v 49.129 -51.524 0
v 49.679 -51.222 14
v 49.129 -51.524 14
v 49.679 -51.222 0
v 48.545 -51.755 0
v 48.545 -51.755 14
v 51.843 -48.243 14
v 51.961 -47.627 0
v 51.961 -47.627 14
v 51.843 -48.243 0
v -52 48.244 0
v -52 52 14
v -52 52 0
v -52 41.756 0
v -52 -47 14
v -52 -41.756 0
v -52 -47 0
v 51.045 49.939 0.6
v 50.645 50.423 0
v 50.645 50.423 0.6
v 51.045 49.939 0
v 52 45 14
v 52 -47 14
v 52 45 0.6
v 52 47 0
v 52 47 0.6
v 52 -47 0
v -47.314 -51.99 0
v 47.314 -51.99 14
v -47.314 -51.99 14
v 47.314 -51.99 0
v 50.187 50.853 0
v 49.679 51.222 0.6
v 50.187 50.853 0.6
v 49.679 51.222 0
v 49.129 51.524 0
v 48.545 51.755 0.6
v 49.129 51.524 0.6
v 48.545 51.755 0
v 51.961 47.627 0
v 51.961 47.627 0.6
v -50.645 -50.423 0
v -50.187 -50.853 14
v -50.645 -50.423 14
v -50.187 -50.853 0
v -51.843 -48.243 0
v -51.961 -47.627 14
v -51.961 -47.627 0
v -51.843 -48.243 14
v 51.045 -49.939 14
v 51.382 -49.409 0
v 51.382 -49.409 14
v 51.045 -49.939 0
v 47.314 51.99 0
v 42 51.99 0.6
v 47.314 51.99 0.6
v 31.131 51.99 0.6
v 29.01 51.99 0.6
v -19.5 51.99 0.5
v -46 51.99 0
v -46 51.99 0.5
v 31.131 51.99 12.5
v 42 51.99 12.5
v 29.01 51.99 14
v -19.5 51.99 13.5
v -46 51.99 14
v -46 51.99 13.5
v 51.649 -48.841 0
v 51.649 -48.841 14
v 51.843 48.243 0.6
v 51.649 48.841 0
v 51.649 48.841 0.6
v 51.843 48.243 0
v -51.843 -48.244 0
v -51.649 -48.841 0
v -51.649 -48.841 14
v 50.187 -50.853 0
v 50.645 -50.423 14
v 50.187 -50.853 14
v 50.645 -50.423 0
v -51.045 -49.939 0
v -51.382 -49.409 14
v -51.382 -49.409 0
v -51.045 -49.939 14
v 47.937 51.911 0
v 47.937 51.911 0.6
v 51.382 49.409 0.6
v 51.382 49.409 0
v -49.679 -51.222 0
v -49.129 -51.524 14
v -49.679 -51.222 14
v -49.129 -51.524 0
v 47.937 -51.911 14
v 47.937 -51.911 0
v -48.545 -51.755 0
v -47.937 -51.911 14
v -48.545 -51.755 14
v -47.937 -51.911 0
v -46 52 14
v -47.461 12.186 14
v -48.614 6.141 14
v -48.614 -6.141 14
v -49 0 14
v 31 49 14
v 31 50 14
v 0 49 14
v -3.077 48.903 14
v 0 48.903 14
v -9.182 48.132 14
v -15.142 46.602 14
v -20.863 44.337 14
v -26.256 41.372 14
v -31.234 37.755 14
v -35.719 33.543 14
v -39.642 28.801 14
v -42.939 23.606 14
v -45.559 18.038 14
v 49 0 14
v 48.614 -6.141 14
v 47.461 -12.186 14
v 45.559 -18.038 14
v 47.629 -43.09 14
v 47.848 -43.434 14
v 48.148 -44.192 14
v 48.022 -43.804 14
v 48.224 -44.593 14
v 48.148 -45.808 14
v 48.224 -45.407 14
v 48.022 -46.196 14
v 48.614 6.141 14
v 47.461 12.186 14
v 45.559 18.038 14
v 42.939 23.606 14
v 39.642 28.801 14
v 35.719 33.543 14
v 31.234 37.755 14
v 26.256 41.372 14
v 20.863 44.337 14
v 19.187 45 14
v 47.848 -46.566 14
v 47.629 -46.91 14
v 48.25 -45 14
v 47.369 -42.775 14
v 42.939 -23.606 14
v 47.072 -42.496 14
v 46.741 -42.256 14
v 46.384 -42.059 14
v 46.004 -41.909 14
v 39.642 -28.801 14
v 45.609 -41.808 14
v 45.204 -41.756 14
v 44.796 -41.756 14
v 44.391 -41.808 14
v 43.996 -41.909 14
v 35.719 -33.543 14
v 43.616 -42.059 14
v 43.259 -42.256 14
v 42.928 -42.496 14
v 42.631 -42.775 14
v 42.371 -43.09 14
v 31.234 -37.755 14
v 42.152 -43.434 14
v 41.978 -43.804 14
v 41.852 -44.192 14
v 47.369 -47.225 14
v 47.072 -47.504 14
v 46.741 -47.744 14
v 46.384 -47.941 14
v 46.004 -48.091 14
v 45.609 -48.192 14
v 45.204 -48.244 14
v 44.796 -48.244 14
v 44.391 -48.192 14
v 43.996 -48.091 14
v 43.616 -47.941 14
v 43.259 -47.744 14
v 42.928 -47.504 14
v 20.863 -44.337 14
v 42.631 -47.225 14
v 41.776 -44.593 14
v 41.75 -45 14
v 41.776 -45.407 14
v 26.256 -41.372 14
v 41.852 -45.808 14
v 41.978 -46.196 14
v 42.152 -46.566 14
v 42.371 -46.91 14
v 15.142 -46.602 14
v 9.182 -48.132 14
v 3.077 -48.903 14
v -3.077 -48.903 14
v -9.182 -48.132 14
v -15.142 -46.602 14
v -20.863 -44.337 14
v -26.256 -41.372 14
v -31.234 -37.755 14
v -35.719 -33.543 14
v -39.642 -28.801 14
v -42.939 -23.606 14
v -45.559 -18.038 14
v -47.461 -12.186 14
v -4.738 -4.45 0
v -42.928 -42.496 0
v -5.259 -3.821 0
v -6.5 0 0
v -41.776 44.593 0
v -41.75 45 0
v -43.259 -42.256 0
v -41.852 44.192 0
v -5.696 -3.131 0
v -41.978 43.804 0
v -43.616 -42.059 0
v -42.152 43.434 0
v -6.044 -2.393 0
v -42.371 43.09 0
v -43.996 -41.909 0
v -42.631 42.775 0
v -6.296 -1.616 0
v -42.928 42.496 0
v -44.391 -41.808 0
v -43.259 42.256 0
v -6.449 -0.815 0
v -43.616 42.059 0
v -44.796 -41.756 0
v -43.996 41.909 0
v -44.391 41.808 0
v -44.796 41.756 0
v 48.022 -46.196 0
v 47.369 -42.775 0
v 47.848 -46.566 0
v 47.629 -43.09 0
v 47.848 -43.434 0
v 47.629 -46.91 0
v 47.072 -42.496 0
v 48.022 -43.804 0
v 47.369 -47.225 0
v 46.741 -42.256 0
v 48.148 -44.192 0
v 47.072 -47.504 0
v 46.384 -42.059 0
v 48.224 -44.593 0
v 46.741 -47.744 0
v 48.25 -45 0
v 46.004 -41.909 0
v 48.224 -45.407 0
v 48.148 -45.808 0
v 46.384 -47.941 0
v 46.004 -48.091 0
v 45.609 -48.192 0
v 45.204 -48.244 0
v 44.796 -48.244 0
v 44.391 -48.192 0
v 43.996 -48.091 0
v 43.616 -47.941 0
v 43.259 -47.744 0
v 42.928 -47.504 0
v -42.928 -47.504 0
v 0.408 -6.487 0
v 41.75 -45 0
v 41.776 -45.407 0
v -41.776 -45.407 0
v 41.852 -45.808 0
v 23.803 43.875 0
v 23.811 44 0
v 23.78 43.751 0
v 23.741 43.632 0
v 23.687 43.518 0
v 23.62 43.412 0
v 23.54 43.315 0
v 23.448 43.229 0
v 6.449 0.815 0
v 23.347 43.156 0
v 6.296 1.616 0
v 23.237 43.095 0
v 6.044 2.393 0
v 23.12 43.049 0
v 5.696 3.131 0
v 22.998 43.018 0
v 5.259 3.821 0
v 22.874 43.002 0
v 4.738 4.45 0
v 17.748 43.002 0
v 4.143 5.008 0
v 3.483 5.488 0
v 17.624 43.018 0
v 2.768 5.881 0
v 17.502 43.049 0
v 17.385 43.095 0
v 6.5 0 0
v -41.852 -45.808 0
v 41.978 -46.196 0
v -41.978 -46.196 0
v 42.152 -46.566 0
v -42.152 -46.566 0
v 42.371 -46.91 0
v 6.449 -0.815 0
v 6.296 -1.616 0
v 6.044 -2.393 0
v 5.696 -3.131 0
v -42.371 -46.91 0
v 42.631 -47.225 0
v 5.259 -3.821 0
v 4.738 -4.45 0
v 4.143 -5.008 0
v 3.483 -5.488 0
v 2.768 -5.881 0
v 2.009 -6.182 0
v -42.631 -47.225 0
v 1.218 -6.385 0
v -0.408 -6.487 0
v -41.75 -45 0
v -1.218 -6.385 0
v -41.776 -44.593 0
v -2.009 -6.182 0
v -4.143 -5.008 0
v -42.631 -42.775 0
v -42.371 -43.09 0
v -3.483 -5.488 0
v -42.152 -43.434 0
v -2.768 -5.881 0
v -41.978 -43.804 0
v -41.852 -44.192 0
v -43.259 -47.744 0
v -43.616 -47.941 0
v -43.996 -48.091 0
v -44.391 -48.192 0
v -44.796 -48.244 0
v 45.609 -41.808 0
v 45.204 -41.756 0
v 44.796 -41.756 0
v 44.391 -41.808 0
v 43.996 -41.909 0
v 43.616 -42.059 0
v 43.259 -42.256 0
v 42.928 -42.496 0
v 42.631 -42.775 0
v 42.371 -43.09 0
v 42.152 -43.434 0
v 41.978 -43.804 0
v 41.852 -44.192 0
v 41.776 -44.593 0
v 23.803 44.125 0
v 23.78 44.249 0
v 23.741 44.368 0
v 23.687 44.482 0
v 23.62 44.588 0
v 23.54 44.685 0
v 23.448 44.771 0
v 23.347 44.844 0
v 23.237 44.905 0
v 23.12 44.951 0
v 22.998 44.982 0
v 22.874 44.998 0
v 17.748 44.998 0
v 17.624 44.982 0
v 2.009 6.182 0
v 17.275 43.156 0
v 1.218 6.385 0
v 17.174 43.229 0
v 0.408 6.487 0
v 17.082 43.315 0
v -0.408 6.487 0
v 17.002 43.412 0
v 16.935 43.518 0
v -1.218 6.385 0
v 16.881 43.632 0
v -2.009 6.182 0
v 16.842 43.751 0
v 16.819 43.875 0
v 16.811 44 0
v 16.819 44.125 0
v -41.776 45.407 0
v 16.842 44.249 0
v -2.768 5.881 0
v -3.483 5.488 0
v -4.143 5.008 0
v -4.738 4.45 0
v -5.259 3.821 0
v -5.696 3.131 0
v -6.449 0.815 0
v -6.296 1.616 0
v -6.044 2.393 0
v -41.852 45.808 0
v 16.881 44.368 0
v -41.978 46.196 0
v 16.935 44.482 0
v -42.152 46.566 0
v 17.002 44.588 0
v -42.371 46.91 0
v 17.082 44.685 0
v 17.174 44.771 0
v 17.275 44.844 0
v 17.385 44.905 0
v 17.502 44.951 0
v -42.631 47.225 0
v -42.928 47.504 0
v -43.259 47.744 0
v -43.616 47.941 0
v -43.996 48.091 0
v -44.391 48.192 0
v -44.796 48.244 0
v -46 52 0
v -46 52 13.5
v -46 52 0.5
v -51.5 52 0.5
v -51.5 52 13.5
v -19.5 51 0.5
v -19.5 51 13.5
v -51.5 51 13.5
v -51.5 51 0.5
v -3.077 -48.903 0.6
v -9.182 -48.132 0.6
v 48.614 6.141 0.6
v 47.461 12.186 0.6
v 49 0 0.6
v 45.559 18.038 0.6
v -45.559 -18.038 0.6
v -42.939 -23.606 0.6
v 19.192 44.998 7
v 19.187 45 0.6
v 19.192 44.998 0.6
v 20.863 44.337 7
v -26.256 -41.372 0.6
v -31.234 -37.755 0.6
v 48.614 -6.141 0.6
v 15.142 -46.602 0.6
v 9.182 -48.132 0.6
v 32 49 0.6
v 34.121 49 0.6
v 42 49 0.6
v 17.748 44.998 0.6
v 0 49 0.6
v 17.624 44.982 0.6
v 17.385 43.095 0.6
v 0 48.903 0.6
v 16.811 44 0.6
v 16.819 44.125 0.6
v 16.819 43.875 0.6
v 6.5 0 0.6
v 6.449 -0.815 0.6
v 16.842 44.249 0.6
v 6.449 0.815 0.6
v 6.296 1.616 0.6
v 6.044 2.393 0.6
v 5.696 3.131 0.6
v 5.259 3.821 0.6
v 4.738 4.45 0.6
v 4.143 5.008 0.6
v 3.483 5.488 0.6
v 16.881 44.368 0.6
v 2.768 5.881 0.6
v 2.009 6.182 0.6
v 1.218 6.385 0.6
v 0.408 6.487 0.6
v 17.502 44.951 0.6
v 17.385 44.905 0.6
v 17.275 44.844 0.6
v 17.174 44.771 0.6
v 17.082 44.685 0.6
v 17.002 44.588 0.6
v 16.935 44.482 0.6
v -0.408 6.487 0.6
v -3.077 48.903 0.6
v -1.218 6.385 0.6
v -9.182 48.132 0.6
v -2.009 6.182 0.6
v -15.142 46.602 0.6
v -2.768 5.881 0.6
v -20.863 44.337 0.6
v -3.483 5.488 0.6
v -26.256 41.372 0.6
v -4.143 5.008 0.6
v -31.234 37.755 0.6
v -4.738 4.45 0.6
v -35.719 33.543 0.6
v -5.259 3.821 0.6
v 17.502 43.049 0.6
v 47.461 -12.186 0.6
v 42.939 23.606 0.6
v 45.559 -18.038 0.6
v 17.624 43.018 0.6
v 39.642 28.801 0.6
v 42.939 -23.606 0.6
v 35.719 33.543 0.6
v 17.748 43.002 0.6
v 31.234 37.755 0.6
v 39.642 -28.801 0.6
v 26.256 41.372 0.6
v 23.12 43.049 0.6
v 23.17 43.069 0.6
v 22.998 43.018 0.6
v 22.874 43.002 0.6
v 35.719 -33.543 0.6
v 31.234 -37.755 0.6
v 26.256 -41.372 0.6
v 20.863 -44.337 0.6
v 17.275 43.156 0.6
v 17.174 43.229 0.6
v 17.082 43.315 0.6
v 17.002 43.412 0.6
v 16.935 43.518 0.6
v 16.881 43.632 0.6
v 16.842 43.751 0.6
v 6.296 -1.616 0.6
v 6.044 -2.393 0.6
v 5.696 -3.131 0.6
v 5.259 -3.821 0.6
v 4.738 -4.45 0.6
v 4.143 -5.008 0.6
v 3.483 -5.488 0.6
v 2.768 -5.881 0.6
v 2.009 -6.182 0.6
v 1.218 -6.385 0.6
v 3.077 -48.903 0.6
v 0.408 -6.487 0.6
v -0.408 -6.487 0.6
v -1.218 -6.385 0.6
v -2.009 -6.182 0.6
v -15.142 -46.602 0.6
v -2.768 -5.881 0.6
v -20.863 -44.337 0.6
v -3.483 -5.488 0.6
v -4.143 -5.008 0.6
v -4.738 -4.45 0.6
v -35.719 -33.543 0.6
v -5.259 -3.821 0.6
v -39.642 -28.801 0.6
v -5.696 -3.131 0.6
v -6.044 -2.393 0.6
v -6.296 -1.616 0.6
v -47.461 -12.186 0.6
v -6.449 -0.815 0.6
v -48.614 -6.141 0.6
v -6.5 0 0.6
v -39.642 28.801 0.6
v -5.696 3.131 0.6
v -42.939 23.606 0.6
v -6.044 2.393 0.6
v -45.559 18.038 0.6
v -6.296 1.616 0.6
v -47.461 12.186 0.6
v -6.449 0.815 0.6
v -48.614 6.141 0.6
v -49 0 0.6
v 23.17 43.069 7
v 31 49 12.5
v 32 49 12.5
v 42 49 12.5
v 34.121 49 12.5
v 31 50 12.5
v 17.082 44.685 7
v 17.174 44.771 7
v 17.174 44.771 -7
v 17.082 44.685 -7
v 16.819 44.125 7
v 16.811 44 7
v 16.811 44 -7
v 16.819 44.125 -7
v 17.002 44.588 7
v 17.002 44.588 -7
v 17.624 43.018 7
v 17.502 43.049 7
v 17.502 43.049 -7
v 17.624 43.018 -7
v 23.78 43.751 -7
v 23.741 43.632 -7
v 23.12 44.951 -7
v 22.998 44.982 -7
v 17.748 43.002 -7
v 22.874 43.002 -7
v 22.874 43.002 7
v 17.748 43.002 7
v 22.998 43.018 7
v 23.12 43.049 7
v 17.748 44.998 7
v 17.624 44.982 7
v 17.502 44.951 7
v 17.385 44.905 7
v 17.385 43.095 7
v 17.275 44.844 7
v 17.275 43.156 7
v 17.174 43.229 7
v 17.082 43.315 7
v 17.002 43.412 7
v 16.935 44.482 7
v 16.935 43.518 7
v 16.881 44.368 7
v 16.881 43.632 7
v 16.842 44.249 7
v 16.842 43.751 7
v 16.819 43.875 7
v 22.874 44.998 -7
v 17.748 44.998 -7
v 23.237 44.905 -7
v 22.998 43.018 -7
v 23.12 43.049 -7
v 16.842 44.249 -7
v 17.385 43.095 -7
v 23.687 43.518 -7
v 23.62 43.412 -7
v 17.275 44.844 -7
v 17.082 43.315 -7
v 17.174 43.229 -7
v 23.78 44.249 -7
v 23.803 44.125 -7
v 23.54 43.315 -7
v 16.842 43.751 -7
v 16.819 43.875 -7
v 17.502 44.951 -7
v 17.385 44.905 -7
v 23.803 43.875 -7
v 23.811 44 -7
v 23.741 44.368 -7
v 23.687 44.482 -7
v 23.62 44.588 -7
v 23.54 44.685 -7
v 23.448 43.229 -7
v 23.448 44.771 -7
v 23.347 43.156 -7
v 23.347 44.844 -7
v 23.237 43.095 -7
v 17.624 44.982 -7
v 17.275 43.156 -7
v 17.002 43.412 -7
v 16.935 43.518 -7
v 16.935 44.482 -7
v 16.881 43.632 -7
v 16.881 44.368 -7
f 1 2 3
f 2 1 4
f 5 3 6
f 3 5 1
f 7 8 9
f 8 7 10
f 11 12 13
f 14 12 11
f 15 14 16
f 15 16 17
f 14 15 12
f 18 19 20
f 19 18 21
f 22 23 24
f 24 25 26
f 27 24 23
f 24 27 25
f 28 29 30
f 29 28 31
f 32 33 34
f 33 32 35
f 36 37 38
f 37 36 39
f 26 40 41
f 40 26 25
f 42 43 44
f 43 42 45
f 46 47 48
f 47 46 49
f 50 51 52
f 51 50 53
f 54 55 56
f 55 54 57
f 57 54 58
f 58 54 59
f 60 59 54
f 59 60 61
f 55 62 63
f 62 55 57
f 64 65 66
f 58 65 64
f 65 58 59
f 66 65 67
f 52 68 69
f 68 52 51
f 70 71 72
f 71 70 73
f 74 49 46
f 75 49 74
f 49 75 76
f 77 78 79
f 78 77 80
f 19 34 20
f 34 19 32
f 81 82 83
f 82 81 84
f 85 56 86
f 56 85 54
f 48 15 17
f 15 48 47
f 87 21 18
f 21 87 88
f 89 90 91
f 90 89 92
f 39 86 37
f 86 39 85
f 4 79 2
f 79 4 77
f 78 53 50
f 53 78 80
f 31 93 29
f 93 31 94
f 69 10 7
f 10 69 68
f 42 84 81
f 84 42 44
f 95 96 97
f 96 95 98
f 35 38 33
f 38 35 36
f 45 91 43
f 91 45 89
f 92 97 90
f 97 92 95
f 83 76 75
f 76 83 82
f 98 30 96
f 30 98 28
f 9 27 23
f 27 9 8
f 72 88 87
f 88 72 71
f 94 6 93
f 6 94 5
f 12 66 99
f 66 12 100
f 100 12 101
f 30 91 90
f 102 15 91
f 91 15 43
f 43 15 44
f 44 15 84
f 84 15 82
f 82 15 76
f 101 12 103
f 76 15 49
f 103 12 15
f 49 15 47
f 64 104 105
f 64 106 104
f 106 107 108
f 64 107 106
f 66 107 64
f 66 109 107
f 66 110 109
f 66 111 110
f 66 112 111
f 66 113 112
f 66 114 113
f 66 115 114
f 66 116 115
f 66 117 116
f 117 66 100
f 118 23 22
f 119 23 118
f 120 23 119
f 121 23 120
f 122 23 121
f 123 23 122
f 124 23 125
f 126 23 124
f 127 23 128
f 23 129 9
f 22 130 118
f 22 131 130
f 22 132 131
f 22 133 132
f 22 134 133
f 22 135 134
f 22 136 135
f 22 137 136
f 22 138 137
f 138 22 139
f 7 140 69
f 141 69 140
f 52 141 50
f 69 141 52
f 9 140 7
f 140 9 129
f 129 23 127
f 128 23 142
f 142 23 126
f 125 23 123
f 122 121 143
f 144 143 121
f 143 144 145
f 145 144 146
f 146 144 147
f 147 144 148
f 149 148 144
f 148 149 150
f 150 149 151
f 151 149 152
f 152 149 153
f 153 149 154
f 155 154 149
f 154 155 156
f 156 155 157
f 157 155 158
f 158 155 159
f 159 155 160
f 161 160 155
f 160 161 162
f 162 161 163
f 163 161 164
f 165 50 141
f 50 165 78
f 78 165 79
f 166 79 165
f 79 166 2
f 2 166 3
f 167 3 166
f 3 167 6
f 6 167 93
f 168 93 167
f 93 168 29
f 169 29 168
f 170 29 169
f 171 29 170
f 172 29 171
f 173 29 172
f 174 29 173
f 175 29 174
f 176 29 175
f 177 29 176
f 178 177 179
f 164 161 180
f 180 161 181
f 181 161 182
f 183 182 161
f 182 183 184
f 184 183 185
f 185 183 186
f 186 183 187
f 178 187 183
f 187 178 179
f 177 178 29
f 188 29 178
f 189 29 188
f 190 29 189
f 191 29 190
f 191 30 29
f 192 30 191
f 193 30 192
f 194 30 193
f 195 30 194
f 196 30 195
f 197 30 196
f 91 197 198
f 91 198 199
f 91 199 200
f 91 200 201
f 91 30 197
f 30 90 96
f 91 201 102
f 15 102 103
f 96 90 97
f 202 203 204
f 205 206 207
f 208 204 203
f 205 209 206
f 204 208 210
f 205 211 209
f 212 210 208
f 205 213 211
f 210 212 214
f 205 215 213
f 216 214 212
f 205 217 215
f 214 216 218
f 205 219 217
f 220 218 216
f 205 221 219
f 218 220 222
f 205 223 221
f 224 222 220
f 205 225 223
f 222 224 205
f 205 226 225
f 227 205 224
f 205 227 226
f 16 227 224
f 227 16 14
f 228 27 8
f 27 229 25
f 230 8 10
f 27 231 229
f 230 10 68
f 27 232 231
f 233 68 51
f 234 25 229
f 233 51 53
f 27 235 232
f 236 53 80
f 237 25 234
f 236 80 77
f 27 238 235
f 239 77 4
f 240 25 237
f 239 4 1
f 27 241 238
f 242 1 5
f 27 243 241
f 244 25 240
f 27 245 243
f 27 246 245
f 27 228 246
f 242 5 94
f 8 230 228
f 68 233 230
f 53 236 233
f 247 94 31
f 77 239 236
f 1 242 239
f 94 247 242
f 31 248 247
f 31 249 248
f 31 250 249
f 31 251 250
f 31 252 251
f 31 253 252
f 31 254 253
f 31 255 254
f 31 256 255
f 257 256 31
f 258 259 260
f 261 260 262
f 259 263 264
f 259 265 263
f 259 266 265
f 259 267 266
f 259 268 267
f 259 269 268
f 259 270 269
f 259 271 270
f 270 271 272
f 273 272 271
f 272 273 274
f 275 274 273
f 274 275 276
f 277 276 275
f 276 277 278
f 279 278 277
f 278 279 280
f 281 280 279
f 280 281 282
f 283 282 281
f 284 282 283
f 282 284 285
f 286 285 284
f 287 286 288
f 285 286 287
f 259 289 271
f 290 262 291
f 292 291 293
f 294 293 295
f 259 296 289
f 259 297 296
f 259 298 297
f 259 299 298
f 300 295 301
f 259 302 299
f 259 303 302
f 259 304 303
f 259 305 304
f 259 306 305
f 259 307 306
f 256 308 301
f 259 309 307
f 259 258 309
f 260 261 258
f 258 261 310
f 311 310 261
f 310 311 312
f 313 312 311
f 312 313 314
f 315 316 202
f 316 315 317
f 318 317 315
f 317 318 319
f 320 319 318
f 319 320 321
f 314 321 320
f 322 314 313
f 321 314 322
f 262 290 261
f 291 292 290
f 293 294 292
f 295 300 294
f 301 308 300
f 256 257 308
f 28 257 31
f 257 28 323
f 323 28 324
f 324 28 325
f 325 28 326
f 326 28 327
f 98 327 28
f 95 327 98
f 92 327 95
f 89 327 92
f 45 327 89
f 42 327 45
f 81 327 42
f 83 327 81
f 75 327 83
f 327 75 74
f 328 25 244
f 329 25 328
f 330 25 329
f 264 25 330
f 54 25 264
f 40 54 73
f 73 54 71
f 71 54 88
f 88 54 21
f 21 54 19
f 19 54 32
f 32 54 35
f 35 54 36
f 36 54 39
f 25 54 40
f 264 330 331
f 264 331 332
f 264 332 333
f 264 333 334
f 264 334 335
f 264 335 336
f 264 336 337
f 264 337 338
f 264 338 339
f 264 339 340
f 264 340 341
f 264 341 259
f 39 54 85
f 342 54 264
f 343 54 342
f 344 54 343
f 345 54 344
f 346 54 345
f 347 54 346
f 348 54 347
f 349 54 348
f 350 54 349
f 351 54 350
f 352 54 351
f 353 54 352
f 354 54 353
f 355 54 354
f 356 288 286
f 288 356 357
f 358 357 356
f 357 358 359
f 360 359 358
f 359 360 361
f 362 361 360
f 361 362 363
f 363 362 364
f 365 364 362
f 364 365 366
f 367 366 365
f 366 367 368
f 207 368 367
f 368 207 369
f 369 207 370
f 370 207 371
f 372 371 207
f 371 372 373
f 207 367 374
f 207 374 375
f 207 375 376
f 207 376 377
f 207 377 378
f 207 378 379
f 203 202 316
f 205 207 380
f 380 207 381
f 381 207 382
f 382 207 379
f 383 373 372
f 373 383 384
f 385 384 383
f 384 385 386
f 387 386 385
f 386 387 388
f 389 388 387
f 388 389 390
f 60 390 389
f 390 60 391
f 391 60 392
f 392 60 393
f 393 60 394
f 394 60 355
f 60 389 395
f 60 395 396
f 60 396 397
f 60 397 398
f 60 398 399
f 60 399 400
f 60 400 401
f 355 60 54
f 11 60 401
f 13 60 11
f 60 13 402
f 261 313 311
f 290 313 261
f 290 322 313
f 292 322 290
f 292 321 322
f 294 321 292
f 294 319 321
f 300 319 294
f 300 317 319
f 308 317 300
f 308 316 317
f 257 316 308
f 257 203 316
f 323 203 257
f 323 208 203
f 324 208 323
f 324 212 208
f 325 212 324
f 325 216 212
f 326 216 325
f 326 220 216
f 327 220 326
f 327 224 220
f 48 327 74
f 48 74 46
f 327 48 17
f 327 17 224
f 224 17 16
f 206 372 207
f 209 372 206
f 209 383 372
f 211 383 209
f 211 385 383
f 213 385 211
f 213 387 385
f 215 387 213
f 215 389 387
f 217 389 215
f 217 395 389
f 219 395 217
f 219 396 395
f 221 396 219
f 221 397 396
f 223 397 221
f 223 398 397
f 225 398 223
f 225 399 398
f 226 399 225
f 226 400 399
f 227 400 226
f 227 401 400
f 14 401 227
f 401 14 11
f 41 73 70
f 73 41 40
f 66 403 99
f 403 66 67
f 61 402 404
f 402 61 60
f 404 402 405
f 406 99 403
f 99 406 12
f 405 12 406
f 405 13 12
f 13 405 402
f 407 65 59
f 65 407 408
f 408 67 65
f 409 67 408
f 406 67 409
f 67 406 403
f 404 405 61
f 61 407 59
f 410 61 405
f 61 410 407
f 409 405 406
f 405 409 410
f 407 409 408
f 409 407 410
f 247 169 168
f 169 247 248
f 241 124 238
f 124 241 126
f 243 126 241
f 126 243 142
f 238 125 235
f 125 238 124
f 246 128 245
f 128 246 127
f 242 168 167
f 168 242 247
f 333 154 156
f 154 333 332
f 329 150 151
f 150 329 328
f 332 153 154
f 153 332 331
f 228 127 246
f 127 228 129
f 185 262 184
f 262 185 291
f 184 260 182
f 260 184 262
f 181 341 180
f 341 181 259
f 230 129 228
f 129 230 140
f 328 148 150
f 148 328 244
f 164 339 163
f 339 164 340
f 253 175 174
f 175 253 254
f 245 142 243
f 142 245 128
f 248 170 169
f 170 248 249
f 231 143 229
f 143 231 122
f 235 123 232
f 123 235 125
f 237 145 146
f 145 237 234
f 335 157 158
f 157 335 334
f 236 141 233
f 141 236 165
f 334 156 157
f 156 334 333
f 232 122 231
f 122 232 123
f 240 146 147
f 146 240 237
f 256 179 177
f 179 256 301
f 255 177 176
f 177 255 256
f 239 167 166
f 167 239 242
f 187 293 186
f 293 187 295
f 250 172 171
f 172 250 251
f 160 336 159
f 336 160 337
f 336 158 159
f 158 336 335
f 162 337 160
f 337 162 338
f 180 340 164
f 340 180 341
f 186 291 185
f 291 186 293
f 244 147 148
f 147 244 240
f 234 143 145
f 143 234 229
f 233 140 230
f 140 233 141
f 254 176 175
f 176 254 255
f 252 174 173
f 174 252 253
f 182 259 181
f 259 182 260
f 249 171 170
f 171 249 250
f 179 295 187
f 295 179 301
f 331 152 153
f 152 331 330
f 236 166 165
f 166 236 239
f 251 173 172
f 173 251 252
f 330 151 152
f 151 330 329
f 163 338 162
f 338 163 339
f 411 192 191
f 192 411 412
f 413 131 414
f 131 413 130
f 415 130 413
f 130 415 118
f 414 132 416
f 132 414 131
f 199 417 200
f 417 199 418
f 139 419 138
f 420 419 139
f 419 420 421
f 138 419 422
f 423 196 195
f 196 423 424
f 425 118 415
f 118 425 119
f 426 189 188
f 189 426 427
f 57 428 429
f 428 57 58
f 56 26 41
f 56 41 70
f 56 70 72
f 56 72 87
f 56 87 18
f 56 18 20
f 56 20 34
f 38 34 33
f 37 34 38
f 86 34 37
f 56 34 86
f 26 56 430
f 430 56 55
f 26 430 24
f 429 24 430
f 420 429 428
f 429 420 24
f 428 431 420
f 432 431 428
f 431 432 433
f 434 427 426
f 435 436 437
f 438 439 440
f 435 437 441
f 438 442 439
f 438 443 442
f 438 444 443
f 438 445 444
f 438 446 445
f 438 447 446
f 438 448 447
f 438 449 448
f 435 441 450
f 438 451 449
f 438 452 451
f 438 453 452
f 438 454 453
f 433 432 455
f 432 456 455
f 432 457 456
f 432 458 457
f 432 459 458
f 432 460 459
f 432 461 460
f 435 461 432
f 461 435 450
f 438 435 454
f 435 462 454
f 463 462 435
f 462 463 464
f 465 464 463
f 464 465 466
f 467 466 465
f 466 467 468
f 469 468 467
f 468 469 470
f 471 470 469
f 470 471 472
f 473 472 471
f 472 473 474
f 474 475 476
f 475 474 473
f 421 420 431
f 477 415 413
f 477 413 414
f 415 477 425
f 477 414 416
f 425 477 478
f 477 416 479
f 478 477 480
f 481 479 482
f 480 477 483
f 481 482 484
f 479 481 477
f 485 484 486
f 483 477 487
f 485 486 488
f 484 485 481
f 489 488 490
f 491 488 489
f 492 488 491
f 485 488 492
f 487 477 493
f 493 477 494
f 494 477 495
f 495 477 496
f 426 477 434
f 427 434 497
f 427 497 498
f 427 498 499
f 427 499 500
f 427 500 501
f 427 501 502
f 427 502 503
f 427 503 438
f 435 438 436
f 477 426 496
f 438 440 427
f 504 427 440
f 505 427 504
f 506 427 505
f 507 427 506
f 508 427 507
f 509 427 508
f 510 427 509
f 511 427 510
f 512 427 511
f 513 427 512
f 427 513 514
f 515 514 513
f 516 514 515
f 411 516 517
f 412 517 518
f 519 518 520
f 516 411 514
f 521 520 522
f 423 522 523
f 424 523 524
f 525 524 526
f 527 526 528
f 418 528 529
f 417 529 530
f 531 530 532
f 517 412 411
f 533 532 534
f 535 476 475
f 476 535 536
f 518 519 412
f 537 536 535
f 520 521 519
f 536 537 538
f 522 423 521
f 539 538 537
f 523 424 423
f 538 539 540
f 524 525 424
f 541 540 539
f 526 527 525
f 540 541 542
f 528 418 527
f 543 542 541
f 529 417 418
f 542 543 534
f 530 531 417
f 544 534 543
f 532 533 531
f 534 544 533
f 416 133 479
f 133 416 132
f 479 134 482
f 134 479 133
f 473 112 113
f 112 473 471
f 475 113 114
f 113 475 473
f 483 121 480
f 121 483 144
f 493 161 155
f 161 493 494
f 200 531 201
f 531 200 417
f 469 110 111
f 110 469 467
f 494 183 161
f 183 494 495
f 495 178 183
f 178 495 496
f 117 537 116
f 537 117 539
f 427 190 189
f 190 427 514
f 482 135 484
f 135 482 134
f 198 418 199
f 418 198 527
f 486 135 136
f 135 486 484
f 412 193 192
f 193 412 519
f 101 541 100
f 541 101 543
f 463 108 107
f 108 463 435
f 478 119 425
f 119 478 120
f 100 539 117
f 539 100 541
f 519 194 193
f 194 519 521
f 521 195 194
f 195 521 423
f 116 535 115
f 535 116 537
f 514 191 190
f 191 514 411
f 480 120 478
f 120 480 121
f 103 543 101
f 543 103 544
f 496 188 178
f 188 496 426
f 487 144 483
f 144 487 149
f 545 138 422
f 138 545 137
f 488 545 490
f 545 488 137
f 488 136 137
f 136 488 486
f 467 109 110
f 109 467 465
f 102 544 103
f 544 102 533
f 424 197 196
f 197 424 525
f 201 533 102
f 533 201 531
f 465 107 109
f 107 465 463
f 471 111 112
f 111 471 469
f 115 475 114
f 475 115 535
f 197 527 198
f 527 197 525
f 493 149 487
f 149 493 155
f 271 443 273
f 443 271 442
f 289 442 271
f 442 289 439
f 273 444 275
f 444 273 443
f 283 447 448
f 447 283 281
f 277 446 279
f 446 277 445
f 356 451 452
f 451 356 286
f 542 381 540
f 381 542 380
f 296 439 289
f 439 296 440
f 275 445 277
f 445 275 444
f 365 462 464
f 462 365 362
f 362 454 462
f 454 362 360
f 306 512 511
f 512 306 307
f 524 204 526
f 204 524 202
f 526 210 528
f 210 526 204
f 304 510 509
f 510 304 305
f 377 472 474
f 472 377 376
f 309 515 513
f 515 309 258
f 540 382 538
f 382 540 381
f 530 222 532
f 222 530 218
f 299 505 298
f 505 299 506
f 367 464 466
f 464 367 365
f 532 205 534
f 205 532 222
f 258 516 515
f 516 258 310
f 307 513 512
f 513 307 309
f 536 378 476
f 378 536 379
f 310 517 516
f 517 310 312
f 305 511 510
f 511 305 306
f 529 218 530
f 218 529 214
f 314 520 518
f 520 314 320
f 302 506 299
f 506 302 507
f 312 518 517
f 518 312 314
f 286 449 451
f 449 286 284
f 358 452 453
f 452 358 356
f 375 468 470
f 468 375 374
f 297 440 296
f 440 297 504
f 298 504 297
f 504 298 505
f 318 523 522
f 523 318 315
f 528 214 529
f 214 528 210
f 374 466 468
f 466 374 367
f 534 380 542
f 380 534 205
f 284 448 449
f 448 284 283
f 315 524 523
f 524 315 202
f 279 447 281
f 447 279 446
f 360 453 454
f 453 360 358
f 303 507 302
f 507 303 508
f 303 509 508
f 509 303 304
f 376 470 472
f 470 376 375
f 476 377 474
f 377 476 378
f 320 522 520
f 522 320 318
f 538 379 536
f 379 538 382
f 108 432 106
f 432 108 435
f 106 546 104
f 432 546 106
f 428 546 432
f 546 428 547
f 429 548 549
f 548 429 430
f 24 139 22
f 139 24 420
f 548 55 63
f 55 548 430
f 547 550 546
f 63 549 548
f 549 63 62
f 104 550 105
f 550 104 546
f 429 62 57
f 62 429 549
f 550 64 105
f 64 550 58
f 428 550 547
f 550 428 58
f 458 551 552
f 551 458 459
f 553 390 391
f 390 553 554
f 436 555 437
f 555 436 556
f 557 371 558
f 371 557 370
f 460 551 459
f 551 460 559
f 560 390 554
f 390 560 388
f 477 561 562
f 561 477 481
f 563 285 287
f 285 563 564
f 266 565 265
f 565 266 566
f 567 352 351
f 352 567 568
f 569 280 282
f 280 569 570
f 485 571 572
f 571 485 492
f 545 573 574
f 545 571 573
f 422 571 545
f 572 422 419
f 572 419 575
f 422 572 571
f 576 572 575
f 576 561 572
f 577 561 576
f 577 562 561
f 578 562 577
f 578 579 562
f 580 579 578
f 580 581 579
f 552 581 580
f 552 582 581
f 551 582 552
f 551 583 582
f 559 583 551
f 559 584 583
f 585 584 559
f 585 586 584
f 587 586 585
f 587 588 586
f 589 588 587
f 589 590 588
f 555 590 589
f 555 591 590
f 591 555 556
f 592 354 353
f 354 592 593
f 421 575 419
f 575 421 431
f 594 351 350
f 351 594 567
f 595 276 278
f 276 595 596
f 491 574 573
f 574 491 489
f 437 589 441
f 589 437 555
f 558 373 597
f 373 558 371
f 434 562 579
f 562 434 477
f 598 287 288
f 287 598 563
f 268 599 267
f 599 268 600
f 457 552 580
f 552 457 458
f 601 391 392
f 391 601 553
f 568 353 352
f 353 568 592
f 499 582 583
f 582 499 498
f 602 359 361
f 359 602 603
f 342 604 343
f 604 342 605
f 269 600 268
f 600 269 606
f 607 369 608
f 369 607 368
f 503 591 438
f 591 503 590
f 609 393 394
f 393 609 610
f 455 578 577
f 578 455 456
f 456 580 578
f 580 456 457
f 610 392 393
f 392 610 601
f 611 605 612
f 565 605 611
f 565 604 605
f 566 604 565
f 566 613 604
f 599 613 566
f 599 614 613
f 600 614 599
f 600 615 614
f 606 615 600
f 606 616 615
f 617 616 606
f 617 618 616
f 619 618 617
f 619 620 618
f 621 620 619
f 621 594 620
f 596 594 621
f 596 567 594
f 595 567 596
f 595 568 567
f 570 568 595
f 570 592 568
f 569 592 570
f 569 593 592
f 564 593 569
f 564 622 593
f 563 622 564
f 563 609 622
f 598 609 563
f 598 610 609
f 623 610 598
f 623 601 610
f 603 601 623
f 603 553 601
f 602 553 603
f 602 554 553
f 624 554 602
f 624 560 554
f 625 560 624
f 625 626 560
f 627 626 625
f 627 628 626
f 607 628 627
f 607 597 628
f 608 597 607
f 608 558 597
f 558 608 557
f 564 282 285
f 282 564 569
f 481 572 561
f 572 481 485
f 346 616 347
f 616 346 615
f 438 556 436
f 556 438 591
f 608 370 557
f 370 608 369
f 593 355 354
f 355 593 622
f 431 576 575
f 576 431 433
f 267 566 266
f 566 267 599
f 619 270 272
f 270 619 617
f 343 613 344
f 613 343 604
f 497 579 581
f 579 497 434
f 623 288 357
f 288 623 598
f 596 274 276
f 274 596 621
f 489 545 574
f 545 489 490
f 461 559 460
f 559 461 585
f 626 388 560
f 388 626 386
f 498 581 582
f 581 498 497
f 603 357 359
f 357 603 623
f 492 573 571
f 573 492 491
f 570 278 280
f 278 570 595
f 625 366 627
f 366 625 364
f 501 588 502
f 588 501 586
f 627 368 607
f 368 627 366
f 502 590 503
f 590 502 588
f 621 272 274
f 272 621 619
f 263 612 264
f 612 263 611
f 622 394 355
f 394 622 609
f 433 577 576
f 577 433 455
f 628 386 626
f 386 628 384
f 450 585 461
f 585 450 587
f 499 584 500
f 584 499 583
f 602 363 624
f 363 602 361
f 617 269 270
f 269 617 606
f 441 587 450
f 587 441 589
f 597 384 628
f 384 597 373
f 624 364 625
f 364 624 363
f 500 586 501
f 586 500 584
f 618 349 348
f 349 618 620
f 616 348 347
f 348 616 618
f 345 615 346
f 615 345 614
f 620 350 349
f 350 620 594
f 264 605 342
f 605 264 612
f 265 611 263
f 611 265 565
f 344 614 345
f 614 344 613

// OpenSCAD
$fn = 50;


union() {
	difference() {
		union() {
			hull() {
				translate(v = [-47.0000000000, 47.0000000000, 0]) {
					cylinder(h = 14, r = 5);
				}
				translate(v = [47.0000000000, 47.0000000000, 0]) {
					cylinder(h = 14, r = 5);
				}
				translate(v = [-47.0000000000, -47.0000000000, 0]) {
					cylinder(h = 14, r = 5);
				}
				translate(v = [47.0000000000, -47.0000000000, 0]) {
					cylinder(h = 14, r = 5);
				}
			}
			translate(v = [-52.0000000000, 46.0000000000, 0]) {
				cube(size = [6, 6, 14]);
			}
		}
		union() {
			translate(v = [-52.5000000000, -45.0000000000, -250.0000000000]) {
				rotate(a = [0, 0, 0]) {
					difference() {
						union() {
							hull() {
								translate(v = [7.5000000000, 0, 0]) {
									cylinder(h = 250, r = 3.2500000000, r1 = 3.2500000000, r2 = 3.2500000000);
								}
								translate(v = [-7.5000000000, 0, 0]) {
									cylinder(h = 250, r = 3.2500000000, r1 = 3.2500000000, r2 = 3.2500000000);
								}
							}
						}
						union();
					}
				}
			}
			translate(v = [-52.5000000000, 45.0000000000, -250.0000000000]) {
				rotate(a = [0, 0, 0]) {
					difference() {
						union() {
							hull() {
								translate(v = [7.5000000000, 0, 0]) {
									cylinder(h = 250, r = 3.2500000000, r1 = 3.2500000000, r2 = 3.2500000000);
								}
								translate(v = [-7.5000000000, 0, 0]) {
									cylinder(h = 250, r = 3.2500000000, r1 = 3.2500000000, r2 = 3.2500000000);
								}
							}
						}
						union();
					}
				}
			}
			translate(v = [-51.5000000000, 51.0000000000, 0.5000000000]) {
				cube(size = [32, 1, 13.0000000000]);
			}
			translate(v = [45.0000000000, -45.0000000000, 0]) {
				cylinder(h = 100, r = 3.2500000000);
			}
			translate(v = [0, 0, 0.6000000000]) {
				cylinder(h = 16.4000000000, r = 49.0000000000);
			}
			translate(v = [0, 0, -7.0000000000]) {
				cylinder(h = 14, r = 6.5000000000);
			}
			translate(v = [0.0000000000, 45.0000000000, 0.6000000000]) {
				cube(size = [52.0000000000, 4, 16.4000000000]);
			}
			translate(v = [42.0000000000, 45.0000000000, 0.6000000000]) {
				cube(size = [10, 7, 16.4000000000]);
			}
			translate(v = [31.0000000000, 45.0000000000, 12.5000000000]) {
				cube(size = [21, 7, 1.5000000000]);
			}
			translate(v = [28.2500000000, 52.7500000000, 0.6000000000]) {
				rotate(a = [0, 0, -45]) {
					cube(size = [7.5000000000, 1.5000000000, 16.4000000000]);
				}
			}
			translate(v = [11.0610000000, 43.0000000000, 0.6000000000]) {
				cube(size = [7.5000000000, 2, 13.4000000000]);
			}
		}
	}
	union() {
		translate(v = [20.3110000000, 44.0000000000, -7.0000000000]) {
			rotate(a = [0, 0, 0]) {
				difference() {
					union() {
						#hull() {
							#translate(v = [2.5000000000, 0, 0]) {
								cylinder(h = 14, r = 1.0000000000, r1 = 1.0000000000, r2 = 1.0000000000);
							}
							#translate(v = [-2.5000000000, 0, 0]) {
								cylinder(h = 14, r = 1.0000000000, r1 = 1.0000000000, r2 = 1.0000000000);
							}
						}
					}
					union();
				}
			}
		}
	}
}
